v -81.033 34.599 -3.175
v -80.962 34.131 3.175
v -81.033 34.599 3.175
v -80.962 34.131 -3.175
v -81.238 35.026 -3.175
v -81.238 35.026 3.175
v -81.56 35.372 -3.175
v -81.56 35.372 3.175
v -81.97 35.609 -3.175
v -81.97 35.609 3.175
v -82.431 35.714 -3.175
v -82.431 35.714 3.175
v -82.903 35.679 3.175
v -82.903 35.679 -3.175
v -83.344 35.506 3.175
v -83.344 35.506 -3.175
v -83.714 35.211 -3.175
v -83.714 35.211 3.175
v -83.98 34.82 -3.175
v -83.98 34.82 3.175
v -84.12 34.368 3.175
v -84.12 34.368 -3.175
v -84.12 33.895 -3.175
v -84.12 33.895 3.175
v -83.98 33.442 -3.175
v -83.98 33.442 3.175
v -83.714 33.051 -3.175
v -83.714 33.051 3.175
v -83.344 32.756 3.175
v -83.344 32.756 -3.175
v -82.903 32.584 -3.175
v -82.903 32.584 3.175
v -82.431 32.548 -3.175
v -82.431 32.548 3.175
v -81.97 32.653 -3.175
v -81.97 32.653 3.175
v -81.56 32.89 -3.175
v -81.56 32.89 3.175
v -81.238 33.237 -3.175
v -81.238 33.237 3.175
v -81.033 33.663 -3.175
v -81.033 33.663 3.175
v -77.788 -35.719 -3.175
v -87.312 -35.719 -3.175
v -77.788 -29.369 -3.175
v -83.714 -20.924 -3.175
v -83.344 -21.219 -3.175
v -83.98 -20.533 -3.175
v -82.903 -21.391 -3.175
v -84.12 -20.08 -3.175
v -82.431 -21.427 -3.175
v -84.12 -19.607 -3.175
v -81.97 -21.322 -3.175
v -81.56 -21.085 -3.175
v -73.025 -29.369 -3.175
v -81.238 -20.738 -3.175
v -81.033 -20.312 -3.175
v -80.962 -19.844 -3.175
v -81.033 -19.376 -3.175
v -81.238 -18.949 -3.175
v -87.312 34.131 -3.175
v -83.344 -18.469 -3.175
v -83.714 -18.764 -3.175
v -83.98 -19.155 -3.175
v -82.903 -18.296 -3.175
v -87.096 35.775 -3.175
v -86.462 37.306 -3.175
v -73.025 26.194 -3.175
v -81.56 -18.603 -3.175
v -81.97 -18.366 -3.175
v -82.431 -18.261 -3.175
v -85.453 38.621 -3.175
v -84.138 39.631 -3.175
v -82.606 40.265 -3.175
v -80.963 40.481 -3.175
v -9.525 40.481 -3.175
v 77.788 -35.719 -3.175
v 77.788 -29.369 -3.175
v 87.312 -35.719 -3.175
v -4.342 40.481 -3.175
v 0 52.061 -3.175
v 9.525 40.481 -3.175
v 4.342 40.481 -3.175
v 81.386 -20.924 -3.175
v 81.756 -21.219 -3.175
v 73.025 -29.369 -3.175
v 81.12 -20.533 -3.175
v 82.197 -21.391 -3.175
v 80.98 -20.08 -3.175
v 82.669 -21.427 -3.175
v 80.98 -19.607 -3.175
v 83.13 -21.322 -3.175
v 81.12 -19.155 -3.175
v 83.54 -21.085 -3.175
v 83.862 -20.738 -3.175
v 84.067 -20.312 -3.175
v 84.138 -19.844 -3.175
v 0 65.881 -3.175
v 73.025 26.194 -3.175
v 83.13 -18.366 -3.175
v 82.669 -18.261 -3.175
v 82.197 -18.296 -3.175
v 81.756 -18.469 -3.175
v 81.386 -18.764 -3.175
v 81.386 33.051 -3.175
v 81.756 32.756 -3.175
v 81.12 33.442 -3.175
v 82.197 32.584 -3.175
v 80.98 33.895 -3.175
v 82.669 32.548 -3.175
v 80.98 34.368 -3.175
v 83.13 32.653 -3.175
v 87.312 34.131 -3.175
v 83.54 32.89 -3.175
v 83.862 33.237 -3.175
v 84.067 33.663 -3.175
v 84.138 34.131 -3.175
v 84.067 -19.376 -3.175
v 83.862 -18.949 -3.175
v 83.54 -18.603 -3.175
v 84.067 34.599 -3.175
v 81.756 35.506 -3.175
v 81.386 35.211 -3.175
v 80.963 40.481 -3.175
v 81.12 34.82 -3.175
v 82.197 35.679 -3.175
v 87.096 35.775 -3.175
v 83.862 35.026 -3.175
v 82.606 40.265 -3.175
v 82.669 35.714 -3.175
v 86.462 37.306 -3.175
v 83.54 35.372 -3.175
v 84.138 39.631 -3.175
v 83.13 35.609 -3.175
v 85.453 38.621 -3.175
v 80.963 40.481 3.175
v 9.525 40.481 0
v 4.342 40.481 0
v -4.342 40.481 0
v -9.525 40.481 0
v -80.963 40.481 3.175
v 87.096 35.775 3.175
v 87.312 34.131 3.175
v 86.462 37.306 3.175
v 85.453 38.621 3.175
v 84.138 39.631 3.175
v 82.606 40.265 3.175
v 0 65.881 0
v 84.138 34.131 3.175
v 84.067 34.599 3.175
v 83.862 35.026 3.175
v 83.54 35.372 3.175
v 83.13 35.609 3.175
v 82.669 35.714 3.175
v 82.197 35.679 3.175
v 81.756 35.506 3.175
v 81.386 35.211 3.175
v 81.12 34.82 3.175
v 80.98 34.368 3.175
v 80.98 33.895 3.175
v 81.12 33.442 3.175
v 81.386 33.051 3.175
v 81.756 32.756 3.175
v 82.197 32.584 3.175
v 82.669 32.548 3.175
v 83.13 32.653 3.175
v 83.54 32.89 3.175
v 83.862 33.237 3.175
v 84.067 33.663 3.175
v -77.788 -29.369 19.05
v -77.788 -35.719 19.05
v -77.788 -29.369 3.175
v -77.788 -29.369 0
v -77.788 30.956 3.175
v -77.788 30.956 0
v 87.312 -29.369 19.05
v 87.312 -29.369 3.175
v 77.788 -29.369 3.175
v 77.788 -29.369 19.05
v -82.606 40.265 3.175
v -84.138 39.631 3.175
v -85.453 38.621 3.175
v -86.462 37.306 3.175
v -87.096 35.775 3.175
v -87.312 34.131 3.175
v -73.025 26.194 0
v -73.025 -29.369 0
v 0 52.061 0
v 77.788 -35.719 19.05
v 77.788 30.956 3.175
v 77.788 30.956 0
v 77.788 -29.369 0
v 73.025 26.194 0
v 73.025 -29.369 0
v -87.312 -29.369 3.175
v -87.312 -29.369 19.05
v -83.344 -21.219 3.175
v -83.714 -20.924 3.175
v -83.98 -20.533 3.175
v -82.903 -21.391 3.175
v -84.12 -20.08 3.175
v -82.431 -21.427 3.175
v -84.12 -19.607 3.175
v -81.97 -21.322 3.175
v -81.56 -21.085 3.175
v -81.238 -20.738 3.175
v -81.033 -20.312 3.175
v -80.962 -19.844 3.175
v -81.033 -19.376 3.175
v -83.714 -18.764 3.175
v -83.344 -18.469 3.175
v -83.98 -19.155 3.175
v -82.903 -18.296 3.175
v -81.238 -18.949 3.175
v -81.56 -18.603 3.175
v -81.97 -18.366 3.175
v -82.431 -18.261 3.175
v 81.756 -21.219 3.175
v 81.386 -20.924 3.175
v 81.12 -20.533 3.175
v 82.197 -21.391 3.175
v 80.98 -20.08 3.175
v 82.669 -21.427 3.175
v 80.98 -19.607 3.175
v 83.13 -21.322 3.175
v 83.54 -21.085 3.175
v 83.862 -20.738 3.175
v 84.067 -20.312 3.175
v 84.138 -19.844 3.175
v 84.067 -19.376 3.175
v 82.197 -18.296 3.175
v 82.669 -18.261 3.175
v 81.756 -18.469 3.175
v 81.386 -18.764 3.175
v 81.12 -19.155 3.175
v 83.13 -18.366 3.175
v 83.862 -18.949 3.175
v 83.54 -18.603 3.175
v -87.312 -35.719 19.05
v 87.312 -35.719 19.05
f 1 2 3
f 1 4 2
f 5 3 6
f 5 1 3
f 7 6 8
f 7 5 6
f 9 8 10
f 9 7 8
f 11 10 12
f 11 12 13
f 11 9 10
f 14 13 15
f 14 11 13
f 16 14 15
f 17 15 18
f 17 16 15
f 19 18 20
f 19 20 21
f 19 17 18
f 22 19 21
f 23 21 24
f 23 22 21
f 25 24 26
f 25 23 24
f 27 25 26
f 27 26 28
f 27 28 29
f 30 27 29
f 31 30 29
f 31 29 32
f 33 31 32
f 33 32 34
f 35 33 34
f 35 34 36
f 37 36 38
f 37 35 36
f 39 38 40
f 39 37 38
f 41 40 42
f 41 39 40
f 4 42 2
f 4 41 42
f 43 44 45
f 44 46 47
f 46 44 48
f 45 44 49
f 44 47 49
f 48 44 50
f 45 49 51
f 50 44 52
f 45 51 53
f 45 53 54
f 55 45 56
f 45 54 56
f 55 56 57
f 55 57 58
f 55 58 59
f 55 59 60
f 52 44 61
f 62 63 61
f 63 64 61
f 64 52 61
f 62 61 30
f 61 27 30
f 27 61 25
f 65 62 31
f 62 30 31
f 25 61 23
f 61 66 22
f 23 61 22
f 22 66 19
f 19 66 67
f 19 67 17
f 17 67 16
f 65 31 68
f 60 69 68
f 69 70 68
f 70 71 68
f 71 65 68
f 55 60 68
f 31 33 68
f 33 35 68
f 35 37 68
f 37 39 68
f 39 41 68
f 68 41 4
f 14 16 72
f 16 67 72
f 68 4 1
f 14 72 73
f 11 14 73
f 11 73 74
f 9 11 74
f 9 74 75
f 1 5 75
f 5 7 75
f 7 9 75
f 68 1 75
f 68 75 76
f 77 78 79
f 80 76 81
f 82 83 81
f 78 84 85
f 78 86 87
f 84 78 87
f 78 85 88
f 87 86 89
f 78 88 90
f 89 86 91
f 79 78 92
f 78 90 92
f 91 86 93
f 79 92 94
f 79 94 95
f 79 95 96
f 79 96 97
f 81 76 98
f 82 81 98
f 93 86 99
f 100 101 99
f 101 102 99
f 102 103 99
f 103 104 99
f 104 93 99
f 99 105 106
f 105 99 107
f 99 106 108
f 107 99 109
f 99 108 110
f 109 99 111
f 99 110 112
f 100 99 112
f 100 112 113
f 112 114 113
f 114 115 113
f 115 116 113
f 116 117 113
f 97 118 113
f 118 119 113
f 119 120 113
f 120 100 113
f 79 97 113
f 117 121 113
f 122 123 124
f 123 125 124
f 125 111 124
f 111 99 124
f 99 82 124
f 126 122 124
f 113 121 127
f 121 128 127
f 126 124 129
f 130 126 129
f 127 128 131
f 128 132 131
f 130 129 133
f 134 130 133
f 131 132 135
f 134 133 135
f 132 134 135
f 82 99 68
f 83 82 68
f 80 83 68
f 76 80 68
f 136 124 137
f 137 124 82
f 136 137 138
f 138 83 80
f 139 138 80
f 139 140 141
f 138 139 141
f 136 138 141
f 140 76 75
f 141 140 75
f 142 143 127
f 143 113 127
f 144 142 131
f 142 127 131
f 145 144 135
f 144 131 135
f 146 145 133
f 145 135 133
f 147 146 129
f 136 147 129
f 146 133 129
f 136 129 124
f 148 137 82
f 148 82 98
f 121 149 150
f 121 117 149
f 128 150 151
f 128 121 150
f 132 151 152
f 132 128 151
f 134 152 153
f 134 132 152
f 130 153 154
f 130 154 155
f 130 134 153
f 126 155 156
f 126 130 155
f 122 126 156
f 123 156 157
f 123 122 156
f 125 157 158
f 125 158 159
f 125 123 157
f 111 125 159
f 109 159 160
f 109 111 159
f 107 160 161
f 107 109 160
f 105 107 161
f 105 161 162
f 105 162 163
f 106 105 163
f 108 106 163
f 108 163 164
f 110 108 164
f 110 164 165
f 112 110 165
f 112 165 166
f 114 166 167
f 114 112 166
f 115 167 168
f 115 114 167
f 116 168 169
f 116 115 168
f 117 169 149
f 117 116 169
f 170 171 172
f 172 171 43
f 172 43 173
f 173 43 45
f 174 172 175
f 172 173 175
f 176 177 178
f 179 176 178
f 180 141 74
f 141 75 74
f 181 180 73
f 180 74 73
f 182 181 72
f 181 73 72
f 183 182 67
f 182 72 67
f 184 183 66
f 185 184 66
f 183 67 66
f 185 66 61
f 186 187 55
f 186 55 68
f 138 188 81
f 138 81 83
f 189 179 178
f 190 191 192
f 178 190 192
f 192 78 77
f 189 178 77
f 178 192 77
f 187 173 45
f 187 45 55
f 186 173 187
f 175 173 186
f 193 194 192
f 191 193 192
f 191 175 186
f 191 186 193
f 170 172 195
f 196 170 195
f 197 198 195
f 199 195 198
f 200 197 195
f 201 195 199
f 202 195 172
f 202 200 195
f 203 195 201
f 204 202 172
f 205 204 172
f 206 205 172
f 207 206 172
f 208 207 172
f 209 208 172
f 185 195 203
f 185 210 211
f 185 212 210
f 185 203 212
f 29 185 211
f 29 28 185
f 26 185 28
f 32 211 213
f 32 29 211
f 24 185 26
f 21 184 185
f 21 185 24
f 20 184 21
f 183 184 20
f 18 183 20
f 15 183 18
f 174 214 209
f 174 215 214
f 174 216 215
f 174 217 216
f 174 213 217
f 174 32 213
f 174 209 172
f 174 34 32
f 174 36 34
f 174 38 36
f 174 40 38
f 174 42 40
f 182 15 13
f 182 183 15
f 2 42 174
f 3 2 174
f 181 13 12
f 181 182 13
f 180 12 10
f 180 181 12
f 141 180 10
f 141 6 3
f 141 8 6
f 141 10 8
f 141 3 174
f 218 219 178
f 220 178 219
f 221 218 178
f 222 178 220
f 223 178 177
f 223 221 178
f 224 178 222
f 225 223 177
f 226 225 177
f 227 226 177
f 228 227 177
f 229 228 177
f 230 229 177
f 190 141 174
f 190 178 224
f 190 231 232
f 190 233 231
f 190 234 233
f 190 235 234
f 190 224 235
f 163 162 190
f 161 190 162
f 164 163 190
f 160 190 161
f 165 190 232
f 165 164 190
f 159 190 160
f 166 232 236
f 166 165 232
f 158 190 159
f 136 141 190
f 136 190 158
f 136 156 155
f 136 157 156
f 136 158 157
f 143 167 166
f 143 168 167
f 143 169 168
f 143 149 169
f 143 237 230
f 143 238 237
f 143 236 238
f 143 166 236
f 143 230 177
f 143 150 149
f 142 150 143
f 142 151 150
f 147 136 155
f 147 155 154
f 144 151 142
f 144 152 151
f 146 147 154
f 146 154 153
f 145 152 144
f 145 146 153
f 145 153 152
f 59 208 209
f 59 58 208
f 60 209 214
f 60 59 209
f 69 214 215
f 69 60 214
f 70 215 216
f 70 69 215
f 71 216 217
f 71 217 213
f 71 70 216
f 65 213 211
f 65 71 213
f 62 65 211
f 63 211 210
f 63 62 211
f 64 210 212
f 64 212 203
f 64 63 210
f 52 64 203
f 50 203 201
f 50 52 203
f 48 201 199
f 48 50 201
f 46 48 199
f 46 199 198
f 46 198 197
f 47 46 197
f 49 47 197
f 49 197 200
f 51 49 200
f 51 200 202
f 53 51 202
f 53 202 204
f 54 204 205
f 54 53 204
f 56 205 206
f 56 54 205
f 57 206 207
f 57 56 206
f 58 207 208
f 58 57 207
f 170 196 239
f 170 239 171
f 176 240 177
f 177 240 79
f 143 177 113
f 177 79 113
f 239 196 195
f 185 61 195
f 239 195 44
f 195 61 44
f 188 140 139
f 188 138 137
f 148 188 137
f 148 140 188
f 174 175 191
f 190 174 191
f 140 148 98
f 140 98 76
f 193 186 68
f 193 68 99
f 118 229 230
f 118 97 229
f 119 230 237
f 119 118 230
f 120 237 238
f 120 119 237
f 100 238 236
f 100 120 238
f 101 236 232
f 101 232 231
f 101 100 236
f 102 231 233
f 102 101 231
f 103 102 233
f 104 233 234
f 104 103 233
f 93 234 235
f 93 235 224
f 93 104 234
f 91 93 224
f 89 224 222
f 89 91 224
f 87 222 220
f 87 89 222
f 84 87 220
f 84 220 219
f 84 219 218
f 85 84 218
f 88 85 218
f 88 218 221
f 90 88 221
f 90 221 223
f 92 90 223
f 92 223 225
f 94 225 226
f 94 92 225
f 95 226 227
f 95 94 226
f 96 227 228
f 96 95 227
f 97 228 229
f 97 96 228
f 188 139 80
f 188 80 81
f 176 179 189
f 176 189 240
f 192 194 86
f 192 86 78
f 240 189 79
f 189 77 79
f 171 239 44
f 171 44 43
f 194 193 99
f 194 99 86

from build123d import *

# Parameters (mm, degrees)
F0_R     = 1.5875
F1_DEPTH = 3.175
F2_DEPTH = 3.175
F3_DEPTH = 19.05


# Not quite as in the source:
# - a feature names something its author has since deleted; it is built from what else it names


with BuildPart() as f1:
    # F0 (on Top) → F1 (new body)
    with BuildSketch(Plane.XY):
        Polygon((-73.025, 26.19375), (73.025, 26.19375), (73.025, -26.19375), (73.025, -29.36875), (77.7875, -29.36875), (77.7875, -26.19375), (77.7875, 30.95625), (-77.7875, 30.95625), (-77.7875, -26.19375), (-77.7875, -29.36875), (-73.025, -29.36875), (-73.025, -26.19375), align=None)
        with BuildLine():
            Line((77.7875, -26.19375), (77.7875, -29.36875))
            Line((77.7875, -29.36875), (87.3125, -29.36875))
            Line((87.3125, -29.36875), (87.3125, -26.19375))
            Line((87.3125, -26.19375), (87.3125, 34.1312500767))
            ThreePointArc((87.3125, 34.1312500767), (85.452628083, 38.621378083), (80.9625000767, 40.48125))
            Line((80.9625000767, 40.48125), (9.525, 40.48125))
            Line((9.525, 40.48125), (7.9375, 40.48125))
            Line((7.9375, 40.48125), (4.3422256552, 40.48125))
            Line((4.3422256552, 40.48125), (-1.5875, 40.48125))
            Line((-1.5875, 40.48125), (-4.3422256552, 40.48125))
            Line((-4.3422256552, 40.48125), (-9.525, 40.48125))
            Line((-9.525, 40.48125), (-80.9625000767, 40.48125))
            ThreePointArc((-80.9625000767, 40.48125), (-85.452628083, 38.621378083), (-87.3125, 34.1312500767))
            Line((-87.3125, 34.1312500767), (-87.3125, -26.19375))
            Line((-87.3125, -26.19375), (-87.3125, -29.36875))
            Line((-87.3125, -29.36875), (-77.7875, -29.36875))
            Line((-77.7875, -29.36875), (-77.7875, -26.19375))
            Line((-77.7875, -26.19375), (-77.7875, 30.95625))
            Line((-77.7875, 30.95625), (77.7875, 30.95625))
            Line((77.7875, 30.95625), (77.7875, -26.19375))
        make_face()
        with Locations((-82.55, -19.84375)):
            Circle(F0_R, mode=Mode.SUBTRACT)
        with Locations((82.55, -19.84375)):
            Circle(F0_R, mode=Mode.SUBTRACT)
        with Locations((-82.55, 34.13125)):
            Circle(F0_R, mode=Mode.SUBTRACT)
        with Locations((82.55, 34.13125)):
            Circle(F0_R, mode=Mode.SUBTRACT)
        Polygon((-77.7875, -32.54375), (-77.7875, -29.36875), (-87.3125, -29.36875), (-87.3125, -32.54375), (-87.3125, -35.71875), (-77.7875, -35.71875), align=None)
        Polygon((87.3125, -29.36875), (77.7875, -29.36875), (77.7875, -32.54375), (77.7875, -35.71875), (87.3125, -35.71875), (87.3125, -32.54375), align=None)
        Polygon((7.9375, 40.48125), (9.525, 40.48125), (0, 65.88125), (-9.525, 40.48125), (-4.3422256552, 40.48125), (0, 52.0605184138), (4.3422256552, 40.48125), align=None)
    extrude(amount=-F1_DEPTH)

    # F0 (on Top) → F2 (join)
    with BuildSketch(Plane.XY):
        with BuildLine():
            Line((77.7875, -26.19375), (77.7875, -29.36875))
            Line((77.7875, -29.36875), (87.3125, -29.36875))
            Line((87.3125, -29.36875), (87.3125, -26.19375))
            Line((87.3125, -26.19375), (87.3125, 34.1312500767))
            ThreePointArc((87.3125, 34.1312500767), (85.452628083, 38.621378083), (80.9625000767, 40.48125))
            Line((80.9625000767, 40.48125), (9.525, 40.48125))
            Line((9.525, 40.48125), (7.9375, 40.48125))
            Line((7.9375, 40.48125), (4.3422256552, 40.48125))
            Line((4.3422256552, 40.48125), (-1.5875, 40.48125))
            Line((-1.5875, 40.48125), (-4.3422256552, 40.48125))
            Line((-4.3422256552, 40.48125), (-9.525, 40.48125))
            Line((-9.525, 40.48125), (-80.9625000767, 40.48125))
            ThreePointArc((-80.9625000767, 40.48125), (-85.452628083, 38.621378083), (-87.3125, 34.1312500767))
            Line((-87.3125, 34.1312500767), (-87.3125, -26.19375))
            Line((-87.3125, -26.19375), (-87.3125, -29.36875))
            Line((-87.3125, -29.36875), (-77.7875, -29.36875))
            Line((-77.7875, -29.36875), (-77.7875, -26.19375))
            Line((-77.7875, -26.19375), (-77.7875, 30.95625))
            Line((-77.7875, 30.95625), (77.7875, 30.95625))
            Line((77.7875, 30.95625), (77.7875, -26.19375))
        make_face()
        with Locations((-82.55, -19.84375)):
            Circle(F0_R, mode=Mode.SUBTRACT)
        with Locations((82.55, -19.84375)):
            Circle(F0_R, mode=Mode.SUBTRACT)
        with Locations((-82.55, 34.13125)):
            Circle(F0_R, mode=Mode.SUBTRACT)
        with Locations((82.55, 34.13125)):
            Circle(F0_R, mode=Mode.SUBTRACT)
    extrude(amount=F2_DEPTH)

    # F0 (on Top) → F3 (join)
    with BuildSketch(Plane.XY):
        Polygon((87.3125, -29.36875), (77.7875, -29.36875), (77.7875, -32.54375), (77.7875, -35.71875), (87.3125, -35.71875), (87.3125, -32.54375), align=None)
        Polygon((-77.7875, -32.54375), (-77.7875, -29.36875), (-87.3125, -29.36875), (-87.3125, -32.54375), (-87.3125, -35.71875), (-77.7875, -35.71875), align=None)
    extrude(amount=F3_DEPTH)


solid = f1.part
